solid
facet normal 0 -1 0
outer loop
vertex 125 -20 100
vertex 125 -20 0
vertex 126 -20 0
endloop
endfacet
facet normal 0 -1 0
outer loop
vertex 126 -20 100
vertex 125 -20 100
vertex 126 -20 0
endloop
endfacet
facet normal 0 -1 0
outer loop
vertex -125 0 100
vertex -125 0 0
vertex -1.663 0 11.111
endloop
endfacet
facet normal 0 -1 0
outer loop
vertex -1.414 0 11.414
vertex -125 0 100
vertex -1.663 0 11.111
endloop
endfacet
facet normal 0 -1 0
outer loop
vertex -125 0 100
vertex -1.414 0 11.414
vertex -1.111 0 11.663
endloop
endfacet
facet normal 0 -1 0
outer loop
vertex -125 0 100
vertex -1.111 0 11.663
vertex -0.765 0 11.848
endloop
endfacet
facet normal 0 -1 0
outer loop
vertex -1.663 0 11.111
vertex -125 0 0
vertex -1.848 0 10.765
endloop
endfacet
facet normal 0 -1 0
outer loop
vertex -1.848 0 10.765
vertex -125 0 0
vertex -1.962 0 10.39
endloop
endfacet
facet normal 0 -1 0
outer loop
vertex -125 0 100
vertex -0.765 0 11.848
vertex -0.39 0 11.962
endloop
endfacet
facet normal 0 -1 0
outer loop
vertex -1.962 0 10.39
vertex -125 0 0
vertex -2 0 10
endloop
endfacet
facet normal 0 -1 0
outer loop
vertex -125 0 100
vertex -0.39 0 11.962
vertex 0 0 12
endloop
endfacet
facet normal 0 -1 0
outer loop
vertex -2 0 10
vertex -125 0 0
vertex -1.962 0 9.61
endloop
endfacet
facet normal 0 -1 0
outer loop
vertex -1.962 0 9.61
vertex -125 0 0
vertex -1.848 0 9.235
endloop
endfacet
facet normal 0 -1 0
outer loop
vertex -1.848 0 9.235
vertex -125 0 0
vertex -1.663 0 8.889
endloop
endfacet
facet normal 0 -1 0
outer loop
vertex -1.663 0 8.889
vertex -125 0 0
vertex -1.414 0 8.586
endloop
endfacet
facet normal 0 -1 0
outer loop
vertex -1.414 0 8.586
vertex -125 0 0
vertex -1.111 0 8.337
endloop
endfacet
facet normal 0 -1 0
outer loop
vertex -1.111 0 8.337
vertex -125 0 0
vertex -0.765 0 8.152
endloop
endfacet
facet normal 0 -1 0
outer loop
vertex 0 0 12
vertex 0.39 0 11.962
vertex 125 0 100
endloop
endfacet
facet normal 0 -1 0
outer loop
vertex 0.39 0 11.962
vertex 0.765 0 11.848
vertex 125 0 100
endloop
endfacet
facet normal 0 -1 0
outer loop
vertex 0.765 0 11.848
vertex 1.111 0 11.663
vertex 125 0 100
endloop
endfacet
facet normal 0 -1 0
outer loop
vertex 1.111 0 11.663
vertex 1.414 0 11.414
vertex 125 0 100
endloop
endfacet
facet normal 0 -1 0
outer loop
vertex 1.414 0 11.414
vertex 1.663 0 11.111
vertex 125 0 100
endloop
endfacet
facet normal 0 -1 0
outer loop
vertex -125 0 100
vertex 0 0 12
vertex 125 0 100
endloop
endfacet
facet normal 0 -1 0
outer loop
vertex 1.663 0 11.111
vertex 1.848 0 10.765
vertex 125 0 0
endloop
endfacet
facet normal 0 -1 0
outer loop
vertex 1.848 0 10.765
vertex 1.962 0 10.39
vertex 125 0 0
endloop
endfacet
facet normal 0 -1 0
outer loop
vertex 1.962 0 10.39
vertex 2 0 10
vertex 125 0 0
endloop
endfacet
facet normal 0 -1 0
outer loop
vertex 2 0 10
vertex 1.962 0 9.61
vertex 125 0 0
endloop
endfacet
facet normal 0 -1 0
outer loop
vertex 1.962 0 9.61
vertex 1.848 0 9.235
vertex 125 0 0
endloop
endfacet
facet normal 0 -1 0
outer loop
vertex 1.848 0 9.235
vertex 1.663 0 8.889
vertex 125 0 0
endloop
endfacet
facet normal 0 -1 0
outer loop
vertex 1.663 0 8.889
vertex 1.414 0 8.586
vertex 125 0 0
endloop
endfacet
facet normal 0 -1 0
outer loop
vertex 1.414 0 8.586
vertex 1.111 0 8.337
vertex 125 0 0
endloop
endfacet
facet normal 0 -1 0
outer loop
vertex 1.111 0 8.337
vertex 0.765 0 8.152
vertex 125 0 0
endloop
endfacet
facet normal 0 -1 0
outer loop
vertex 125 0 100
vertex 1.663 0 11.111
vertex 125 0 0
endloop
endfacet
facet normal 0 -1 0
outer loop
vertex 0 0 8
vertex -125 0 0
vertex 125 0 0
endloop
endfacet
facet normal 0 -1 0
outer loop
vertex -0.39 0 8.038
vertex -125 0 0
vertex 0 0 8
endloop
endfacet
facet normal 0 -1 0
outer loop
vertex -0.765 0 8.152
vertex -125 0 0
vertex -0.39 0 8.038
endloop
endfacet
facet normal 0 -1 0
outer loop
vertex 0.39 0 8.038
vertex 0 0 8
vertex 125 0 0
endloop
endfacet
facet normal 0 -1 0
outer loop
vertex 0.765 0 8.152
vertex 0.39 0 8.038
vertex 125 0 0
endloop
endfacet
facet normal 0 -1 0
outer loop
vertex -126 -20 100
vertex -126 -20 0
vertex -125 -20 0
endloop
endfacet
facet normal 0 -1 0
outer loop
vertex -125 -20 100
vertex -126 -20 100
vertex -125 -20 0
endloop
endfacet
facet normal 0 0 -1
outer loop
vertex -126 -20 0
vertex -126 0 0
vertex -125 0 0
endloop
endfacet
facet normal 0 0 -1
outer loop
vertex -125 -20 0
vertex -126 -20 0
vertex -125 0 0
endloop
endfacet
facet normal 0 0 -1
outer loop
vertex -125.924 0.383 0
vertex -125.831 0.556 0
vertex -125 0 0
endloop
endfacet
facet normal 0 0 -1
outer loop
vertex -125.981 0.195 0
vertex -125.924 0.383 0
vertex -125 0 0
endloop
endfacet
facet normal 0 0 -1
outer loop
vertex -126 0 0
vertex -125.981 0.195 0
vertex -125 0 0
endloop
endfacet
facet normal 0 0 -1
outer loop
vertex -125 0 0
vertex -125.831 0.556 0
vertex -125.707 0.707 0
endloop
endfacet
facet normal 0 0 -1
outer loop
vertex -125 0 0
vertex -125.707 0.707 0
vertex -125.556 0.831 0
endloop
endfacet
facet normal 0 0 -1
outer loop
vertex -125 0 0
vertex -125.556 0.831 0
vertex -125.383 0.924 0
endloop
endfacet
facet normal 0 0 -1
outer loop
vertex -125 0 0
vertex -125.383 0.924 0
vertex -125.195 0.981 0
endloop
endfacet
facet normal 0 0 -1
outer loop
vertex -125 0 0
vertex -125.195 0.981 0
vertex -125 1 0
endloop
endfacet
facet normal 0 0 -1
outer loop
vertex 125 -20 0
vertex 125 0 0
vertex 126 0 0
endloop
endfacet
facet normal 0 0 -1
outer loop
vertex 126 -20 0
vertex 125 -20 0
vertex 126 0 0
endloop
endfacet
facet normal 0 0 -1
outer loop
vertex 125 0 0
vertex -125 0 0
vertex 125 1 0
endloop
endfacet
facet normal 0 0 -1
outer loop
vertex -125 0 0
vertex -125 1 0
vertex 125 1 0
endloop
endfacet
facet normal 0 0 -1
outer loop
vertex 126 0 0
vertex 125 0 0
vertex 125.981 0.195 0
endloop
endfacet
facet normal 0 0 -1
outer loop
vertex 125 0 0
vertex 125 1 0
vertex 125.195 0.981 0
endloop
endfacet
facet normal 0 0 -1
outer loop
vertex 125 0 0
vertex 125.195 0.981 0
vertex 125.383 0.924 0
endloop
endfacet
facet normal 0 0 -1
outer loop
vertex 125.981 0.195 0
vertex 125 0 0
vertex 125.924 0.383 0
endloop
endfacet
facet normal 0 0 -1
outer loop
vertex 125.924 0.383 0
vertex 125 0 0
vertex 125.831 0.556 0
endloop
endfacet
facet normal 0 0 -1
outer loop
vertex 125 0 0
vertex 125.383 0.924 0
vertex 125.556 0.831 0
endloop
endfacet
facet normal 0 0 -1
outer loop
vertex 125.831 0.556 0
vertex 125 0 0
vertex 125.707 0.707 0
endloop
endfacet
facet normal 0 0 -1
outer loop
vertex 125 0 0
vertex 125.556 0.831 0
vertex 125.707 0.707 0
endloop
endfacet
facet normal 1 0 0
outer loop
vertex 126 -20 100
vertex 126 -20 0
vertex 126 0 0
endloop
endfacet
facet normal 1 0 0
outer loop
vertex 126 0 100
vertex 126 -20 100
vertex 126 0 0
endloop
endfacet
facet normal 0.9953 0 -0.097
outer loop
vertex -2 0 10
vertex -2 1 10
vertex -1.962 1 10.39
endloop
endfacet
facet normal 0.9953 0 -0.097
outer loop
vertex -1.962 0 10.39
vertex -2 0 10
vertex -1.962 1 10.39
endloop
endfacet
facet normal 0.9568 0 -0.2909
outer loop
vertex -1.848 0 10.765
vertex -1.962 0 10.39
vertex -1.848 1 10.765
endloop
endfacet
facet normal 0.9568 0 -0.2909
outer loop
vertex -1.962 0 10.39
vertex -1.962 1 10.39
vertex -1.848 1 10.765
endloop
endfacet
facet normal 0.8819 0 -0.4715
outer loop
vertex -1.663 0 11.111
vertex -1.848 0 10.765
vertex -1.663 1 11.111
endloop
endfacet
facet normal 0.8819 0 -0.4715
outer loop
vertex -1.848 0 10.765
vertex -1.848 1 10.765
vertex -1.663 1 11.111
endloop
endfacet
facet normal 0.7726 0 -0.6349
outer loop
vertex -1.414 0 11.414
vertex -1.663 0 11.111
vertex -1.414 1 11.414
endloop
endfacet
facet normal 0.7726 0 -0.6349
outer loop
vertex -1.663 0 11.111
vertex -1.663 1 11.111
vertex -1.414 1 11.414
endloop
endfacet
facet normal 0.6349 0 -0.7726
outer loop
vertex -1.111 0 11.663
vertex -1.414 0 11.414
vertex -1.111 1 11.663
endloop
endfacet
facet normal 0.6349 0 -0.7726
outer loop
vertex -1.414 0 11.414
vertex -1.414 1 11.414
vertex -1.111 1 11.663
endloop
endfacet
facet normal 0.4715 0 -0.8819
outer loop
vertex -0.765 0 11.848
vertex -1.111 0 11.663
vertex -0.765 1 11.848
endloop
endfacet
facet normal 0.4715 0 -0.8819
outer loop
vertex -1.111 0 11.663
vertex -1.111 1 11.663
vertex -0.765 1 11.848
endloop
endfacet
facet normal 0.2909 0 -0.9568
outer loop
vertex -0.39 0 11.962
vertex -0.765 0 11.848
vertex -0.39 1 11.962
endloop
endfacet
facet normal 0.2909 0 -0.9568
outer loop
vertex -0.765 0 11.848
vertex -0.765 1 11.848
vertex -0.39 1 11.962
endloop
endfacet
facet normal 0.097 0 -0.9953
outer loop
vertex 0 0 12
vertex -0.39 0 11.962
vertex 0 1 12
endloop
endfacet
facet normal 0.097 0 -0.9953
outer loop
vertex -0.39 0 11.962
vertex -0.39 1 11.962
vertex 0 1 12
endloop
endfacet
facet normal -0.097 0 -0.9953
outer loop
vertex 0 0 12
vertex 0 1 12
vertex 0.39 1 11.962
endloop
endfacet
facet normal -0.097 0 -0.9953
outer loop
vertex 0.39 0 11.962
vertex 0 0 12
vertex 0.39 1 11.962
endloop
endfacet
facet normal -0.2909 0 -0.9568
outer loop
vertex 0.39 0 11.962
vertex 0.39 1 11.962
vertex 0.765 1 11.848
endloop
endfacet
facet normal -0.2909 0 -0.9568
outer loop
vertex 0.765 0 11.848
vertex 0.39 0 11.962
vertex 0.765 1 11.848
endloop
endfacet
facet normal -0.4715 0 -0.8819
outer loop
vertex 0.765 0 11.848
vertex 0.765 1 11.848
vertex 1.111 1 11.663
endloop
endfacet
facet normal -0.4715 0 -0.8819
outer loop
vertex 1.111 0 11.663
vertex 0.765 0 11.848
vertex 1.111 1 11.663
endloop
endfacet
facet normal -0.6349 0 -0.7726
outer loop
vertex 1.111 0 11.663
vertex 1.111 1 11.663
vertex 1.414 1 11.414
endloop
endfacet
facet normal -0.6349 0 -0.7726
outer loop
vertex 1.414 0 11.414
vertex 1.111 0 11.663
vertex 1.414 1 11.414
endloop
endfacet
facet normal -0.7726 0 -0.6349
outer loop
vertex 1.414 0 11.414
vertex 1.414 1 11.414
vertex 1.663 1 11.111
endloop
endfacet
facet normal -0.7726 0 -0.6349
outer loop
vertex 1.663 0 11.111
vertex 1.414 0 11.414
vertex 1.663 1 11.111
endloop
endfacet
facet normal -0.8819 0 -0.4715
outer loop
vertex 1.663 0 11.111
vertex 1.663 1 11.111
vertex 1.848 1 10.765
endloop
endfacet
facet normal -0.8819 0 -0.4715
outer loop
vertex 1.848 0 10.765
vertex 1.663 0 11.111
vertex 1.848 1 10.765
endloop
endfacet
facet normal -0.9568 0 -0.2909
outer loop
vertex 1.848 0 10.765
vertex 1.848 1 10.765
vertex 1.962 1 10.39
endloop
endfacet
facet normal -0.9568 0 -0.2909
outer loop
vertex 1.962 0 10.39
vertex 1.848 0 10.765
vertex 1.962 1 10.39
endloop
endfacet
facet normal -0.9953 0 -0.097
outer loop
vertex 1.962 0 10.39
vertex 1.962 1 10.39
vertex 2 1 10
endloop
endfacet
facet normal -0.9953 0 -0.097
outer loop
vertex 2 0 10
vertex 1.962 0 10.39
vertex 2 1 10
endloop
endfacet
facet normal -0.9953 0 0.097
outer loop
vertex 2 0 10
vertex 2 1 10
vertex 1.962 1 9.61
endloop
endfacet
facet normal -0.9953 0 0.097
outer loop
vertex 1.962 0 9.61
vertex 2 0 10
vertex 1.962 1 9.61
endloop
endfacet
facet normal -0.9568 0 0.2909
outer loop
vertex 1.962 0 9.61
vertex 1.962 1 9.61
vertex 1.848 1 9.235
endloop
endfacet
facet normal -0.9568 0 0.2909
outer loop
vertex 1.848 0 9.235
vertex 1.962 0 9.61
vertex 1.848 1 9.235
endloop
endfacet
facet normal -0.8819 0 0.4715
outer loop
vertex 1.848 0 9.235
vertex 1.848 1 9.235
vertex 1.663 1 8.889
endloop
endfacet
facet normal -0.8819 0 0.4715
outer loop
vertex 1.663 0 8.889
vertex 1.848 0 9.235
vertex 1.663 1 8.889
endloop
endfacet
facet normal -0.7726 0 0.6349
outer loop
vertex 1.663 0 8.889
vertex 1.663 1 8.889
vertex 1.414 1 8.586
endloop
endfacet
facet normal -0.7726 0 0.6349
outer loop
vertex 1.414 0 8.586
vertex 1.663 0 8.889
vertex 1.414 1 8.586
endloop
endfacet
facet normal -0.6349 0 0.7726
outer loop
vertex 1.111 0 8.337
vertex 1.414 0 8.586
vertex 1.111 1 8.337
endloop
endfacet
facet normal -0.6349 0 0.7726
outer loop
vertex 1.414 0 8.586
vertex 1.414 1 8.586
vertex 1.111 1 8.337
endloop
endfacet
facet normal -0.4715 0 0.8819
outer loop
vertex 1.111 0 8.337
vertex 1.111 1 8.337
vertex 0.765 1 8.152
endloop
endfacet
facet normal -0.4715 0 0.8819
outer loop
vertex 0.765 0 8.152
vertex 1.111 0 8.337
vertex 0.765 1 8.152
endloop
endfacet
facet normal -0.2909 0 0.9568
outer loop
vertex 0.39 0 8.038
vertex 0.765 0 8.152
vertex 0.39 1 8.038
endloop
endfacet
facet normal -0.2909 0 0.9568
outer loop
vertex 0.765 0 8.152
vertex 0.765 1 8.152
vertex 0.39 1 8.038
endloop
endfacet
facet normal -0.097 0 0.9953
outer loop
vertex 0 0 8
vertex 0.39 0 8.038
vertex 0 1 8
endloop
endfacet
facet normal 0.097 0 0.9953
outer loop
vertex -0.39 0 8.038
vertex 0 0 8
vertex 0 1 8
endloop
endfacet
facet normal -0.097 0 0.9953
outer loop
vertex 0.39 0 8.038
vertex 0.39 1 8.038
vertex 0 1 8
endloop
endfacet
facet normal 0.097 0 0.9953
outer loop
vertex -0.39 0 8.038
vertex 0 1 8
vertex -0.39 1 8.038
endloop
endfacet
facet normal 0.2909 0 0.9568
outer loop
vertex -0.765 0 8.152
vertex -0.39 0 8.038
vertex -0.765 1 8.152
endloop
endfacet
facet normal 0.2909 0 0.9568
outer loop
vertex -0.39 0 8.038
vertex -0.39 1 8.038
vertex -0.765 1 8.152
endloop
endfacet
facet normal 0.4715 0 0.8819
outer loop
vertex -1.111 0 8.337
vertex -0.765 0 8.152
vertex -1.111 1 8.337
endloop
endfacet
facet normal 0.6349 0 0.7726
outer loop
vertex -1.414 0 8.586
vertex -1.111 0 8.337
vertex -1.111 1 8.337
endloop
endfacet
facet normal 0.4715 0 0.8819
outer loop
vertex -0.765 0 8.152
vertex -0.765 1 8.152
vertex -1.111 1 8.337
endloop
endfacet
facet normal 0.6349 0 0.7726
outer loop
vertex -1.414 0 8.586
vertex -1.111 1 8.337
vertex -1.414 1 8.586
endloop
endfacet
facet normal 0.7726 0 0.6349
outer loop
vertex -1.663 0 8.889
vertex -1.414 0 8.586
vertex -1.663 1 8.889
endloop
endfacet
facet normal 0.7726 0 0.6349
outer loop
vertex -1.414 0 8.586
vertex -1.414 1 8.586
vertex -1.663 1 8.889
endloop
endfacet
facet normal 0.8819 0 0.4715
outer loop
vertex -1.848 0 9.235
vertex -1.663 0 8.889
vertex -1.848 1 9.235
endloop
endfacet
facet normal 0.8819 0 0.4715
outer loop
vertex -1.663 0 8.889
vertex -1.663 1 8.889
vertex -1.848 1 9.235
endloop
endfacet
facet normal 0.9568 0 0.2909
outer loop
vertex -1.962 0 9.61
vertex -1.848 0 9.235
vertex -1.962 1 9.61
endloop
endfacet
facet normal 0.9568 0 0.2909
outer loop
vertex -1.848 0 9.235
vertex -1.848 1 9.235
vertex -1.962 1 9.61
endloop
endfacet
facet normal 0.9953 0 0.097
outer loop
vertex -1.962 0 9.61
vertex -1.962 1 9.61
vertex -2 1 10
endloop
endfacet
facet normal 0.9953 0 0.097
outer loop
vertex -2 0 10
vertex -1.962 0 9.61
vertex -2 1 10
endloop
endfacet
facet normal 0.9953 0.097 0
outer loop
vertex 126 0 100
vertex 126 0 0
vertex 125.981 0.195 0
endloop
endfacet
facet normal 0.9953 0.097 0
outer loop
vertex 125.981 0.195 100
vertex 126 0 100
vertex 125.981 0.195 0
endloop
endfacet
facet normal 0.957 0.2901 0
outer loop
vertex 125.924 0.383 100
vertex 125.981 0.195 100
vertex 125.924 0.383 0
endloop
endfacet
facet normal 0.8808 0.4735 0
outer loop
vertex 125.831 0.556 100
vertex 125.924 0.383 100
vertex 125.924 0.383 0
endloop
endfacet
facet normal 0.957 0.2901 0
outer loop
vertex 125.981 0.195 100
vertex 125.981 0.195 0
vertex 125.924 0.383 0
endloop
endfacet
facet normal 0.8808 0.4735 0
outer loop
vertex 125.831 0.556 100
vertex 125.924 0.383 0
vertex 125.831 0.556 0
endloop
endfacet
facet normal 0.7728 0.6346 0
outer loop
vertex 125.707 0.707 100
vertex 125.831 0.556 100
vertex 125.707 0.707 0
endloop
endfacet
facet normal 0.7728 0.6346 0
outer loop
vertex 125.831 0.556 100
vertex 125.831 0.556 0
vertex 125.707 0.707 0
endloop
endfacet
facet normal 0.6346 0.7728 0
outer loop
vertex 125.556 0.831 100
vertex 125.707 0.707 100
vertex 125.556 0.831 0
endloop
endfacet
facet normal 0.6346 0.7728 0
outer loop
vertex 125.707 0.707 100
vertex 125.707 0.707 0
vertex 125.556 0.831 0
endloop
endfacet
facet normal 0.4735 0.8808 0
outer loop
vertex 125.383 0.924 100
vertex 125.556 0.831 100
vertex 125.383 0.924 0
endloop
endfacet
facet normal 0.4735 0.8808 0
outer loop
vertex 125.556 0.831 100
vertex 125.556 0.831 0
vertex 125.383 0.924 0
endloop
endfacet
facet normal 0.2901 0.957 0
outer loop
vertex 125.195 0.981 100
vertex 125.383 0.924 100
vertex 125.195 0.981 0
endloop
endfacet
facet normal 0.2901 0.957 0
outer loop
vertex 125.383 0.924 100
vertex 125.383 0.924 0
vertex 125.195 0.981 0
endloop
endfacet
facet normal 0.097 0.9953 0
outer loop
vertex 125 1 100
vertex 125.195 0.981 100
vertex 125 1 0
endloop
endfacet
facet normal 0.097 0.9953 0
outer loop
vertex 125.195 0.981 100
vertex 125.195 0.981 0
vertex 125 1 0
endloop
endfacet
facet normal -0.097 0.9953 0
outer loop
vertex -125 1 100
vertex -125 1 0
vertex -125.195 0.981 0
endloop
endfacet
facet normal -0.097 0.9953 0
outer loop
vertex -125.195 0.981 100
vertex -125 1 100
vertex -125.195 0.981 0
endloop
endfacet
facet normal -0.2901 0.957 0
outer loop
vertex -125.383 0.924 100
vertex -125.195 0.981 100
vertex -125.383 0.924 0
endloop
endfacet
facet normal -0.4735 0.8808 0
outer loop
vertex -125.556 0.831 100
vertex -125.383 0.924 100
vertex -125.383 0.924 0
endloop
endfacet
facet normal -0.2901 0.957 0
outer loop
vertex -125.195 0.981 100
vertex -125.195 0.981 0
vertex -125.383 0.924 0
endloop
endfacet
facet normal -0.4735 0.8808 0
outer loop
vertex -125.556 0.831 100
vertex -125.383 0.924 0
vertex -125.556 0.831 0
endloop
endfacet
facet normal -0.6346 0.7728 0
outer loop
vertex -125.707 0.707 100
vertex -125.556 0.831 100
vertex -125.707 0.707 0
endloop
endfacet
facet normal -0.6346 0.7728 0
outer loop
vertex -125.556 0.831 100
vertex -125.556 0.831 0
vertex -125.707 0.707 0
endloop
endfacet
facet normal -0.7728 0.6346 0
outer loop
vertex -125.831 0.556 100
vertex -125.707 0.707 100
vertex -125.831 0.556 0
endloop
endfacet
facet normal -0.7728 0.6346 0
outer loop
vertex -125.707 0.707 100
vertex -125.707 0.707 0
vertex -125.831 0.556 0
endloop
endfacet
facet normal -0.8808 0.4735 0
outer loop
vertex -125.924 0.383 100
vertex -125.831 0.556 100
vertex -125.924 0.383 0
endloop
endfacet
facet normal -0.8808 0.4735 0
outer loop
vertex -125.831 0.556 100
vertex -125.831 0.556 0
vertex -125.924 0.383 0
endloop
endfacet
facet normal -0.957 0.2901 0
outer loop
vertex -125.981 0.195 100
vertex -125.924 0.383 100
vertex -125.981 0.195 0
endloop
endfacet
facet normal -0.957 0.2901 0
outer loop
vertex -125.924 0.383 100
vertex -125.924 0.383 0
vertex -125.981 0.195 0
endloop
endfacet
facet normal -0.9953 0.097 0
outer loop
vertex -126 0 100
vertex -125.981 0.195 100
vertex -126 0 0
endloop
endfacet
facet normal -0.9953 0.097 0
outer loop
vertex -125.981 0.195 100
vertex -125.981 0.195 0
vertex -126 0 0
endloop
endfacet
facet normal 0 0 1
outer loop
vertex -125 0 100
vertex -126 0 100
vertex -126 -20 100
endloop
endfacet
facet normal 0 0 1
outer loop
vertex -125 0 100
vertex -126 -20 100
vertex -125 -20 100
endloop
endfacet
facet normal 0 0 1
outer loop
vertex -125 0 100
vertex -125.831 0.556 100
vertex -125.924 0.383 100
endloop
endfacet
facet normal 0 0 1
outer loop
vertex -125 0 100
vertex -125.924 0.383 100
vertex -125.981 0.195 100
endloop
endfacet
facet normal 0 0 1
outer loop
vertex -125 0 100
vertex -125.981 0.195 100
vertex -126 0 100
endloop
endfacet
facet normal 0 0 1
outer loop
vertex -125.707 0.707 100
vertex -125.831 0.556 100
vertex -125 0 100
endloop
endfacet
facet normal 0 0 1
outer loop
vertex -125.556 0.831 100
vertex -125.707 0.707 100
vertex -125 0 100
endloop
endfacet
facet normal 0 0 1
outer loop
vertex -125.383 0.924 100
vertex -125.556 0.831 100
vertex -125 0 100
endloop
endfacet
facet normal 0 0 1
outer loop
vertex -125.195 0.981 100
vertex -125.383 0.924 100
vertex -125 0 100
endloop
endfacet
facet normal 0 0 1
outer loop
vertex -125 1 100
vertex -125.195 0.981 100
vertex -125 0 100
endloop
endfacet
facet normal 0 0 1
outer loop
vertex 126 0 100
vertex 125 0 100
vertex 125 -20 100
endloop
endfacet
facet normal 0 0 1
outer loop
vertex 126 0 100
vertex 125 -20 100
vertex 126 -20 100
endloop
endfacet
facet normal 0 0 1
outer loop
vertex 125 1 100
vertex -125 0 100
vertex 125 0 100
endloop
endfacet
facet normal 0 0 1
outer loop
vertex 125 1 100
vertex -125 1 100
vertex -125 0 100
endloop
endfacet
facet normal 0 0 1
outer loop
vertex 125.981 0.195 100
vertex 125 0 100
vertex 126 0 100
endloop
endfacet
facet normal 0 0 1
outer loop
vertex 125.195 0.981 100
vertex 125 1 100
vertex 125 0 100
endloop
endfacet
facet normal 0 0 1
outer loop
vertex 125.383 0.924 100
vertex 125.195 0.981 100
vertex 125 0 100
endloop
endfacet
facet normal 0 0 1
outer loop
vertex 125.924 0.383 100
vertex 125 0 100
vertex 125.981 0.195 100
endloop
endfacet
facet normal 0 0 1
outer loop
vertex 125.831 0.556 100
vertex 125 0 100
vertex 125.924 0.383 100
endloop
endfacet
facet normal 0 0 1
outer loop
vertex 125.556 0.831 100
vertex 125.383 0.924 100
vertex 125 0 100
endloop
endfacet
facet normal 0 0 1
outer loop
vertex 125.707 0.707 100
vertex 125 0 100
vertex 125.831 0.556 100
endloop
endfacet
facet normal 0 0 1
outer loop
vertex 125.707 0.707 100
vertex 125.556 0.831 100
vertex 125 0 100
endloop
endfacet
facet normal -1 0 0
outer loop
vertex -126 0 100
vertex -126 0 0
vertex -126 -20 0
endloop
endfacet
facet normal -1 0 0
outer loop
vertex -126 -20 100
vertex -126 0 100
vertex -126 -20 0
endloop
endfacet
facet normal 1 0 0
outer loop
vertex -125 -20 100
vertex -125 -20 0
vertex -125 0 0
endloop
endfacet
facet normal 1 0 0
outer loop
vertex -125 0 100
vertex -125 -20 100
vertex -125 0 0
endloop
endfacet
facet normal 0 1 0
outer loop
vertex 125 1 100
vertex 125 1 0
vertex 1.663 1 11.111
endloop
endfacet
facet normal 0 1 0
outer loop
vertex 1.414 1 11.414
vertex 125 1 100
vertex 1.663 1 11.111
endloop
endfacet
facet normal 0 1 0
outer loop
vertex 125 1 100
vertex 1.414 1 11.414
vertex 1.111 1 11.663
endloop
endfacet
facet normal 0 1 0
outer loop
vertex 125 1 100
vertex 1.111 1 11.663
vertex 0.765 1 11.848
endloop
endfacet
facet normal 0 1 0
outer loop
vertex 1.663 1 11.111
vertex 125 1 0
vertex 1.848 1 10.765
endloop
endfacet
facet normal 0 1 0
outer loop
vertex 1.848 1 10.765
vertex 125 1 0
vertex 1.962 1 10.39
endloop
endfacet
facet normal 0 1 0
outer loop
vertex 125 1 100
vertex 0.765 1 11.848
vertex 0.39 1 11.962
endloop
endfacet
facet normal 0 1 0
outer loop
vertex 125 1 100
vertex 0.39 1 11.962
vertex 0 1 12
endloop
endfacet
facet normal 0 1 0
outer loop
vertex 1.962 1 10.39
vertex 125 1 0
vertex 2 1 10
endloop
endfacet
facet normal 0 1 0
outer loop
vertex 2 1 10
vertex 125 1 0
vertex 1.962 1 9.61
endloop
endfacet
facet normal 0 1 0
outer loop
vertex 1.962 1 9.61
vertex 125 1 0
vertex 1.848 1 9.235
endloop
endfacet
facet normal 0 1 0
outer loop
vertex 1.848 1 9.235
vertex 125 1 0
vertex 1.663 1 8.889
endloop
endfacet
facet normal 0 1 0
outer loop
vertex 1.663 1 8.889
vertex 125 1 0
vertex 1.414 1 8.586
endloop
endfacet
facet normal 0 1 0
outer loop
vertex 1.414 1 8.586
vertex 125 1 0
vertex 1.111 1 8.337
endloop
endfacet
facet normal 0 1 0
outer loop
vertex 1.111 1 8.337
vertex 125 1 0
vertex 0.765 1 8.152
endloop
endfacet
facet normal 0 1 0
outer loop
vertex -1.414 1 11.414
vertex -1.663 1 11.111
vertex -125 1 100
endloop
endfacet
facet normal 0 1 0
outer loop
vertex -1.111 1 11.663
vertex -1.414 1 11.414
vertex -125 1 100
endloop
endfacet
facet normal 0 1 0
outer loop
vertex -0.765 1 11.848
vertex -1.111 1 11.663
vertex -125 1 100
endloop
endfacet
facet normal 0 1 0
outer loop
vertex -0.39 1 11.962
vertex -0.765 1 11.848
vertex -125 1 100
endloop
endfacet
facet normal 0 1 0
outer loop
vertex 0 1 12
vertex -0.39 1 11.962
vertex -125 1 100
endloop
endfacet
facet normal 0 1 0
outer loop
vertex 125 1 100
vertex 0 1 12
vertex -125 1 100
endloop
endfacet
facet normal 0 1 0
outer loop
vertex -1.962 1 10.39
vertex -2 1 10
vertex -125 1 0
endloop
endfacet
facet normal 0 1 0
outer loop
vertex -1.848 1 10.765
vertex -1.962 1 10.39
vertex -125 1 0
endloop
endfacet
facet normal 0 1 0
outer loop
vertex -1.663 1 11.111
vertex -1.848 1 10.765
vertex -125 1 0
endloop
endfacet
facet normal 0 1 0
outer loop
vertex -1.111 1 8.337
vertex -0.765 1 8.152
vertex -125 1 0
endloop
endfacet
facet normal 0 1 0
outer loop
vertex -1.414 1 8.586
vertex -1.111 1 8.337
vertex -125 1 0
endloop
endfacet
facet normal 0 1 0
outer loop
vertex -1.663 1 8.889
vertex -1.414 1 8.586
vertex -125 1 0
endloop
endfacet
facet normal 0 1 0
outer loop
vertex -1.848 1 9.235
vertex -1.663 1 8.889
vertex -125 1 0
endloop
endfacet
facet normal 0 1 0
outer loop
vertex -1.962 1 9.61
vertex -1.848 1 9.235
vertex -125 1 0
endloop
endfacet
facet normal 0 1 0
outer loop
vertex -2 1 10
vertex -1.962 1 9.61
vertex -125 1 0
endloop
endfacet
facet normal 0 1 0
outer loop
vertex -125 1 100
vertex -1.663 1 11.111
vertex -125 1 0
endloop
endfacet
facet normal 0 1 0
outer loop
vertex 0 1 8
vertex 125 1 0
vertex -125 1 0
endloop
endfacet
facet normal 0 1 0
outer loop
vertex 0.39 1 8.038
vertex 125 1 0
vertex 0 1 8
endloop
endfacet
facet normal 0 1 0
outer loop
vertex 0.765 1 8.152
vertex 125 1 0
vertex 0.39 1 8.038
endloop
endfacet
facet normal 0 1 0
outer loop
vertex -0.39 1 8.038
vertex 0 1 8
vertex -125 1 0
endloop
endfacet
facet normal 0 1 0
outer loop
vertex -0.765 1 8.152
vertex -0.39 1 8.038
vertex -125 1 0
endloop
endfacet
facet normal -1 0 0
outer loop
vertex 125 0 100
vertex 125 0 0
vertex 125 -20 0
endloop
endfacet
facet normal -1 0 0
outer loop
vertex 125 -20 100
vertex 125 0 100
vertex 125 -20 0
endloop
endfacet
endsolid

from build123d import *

# Parameters (mm, degrees)
T_LE_DE_BASE_PLI_E1_DEPTH = 100
ESQUISSE6_R               = 2
ENL_V_MAT_EXTRU_1_DEPTH   = 163.225152181


# Read off the part's stored shape, not the designer's step: Tôle de base pliée1
with BuildPart() as part:
    # Tôle de base pliée1 outline → Tôle de base pliée1 (new body)
    with BuildSketch(Plane.XY):
        with BuildLine():
            Line((-126, 0), (-126, -20))
            Line((-126, -20), (-125, -20))
            Line((-125, -20), (-125, 0))
            Line((-125, 0), (125, 0))
            Line((125, 0), (125, -20))
            Line((125, -20), (126, -20))
            Line((126, -20), (126, 0))
            ThreePointArc((126, 0), (125.707106781, 0.707106781), (125, 1))
            Line((125, 1), (-125, 1))
            ThreePointArc((-125, 1), (-125.707106781, 0.707106781), (-126, 0))
        make_face()
    extrude(amount=T_LE_DE_BASE_PLI_E1_DEPTH)

    # Esquisse6 → Enlèv. mat.-Extru.1 (cut, through all)
    with BuildSketch(Plane(origin=(0, 1, 0), x_dir=(1, 0, 0), z_dir=(0, 1, 0))):
        with Locations(Location((0, -10, 0), (0, 0, 180))):
            Circle(ESQUISSE6_R)
    extrude(amount=-ENL_V_MAT_EXTRU_1_DEPTH, mode=Mode.SUBTRACT)


solid = part.part
